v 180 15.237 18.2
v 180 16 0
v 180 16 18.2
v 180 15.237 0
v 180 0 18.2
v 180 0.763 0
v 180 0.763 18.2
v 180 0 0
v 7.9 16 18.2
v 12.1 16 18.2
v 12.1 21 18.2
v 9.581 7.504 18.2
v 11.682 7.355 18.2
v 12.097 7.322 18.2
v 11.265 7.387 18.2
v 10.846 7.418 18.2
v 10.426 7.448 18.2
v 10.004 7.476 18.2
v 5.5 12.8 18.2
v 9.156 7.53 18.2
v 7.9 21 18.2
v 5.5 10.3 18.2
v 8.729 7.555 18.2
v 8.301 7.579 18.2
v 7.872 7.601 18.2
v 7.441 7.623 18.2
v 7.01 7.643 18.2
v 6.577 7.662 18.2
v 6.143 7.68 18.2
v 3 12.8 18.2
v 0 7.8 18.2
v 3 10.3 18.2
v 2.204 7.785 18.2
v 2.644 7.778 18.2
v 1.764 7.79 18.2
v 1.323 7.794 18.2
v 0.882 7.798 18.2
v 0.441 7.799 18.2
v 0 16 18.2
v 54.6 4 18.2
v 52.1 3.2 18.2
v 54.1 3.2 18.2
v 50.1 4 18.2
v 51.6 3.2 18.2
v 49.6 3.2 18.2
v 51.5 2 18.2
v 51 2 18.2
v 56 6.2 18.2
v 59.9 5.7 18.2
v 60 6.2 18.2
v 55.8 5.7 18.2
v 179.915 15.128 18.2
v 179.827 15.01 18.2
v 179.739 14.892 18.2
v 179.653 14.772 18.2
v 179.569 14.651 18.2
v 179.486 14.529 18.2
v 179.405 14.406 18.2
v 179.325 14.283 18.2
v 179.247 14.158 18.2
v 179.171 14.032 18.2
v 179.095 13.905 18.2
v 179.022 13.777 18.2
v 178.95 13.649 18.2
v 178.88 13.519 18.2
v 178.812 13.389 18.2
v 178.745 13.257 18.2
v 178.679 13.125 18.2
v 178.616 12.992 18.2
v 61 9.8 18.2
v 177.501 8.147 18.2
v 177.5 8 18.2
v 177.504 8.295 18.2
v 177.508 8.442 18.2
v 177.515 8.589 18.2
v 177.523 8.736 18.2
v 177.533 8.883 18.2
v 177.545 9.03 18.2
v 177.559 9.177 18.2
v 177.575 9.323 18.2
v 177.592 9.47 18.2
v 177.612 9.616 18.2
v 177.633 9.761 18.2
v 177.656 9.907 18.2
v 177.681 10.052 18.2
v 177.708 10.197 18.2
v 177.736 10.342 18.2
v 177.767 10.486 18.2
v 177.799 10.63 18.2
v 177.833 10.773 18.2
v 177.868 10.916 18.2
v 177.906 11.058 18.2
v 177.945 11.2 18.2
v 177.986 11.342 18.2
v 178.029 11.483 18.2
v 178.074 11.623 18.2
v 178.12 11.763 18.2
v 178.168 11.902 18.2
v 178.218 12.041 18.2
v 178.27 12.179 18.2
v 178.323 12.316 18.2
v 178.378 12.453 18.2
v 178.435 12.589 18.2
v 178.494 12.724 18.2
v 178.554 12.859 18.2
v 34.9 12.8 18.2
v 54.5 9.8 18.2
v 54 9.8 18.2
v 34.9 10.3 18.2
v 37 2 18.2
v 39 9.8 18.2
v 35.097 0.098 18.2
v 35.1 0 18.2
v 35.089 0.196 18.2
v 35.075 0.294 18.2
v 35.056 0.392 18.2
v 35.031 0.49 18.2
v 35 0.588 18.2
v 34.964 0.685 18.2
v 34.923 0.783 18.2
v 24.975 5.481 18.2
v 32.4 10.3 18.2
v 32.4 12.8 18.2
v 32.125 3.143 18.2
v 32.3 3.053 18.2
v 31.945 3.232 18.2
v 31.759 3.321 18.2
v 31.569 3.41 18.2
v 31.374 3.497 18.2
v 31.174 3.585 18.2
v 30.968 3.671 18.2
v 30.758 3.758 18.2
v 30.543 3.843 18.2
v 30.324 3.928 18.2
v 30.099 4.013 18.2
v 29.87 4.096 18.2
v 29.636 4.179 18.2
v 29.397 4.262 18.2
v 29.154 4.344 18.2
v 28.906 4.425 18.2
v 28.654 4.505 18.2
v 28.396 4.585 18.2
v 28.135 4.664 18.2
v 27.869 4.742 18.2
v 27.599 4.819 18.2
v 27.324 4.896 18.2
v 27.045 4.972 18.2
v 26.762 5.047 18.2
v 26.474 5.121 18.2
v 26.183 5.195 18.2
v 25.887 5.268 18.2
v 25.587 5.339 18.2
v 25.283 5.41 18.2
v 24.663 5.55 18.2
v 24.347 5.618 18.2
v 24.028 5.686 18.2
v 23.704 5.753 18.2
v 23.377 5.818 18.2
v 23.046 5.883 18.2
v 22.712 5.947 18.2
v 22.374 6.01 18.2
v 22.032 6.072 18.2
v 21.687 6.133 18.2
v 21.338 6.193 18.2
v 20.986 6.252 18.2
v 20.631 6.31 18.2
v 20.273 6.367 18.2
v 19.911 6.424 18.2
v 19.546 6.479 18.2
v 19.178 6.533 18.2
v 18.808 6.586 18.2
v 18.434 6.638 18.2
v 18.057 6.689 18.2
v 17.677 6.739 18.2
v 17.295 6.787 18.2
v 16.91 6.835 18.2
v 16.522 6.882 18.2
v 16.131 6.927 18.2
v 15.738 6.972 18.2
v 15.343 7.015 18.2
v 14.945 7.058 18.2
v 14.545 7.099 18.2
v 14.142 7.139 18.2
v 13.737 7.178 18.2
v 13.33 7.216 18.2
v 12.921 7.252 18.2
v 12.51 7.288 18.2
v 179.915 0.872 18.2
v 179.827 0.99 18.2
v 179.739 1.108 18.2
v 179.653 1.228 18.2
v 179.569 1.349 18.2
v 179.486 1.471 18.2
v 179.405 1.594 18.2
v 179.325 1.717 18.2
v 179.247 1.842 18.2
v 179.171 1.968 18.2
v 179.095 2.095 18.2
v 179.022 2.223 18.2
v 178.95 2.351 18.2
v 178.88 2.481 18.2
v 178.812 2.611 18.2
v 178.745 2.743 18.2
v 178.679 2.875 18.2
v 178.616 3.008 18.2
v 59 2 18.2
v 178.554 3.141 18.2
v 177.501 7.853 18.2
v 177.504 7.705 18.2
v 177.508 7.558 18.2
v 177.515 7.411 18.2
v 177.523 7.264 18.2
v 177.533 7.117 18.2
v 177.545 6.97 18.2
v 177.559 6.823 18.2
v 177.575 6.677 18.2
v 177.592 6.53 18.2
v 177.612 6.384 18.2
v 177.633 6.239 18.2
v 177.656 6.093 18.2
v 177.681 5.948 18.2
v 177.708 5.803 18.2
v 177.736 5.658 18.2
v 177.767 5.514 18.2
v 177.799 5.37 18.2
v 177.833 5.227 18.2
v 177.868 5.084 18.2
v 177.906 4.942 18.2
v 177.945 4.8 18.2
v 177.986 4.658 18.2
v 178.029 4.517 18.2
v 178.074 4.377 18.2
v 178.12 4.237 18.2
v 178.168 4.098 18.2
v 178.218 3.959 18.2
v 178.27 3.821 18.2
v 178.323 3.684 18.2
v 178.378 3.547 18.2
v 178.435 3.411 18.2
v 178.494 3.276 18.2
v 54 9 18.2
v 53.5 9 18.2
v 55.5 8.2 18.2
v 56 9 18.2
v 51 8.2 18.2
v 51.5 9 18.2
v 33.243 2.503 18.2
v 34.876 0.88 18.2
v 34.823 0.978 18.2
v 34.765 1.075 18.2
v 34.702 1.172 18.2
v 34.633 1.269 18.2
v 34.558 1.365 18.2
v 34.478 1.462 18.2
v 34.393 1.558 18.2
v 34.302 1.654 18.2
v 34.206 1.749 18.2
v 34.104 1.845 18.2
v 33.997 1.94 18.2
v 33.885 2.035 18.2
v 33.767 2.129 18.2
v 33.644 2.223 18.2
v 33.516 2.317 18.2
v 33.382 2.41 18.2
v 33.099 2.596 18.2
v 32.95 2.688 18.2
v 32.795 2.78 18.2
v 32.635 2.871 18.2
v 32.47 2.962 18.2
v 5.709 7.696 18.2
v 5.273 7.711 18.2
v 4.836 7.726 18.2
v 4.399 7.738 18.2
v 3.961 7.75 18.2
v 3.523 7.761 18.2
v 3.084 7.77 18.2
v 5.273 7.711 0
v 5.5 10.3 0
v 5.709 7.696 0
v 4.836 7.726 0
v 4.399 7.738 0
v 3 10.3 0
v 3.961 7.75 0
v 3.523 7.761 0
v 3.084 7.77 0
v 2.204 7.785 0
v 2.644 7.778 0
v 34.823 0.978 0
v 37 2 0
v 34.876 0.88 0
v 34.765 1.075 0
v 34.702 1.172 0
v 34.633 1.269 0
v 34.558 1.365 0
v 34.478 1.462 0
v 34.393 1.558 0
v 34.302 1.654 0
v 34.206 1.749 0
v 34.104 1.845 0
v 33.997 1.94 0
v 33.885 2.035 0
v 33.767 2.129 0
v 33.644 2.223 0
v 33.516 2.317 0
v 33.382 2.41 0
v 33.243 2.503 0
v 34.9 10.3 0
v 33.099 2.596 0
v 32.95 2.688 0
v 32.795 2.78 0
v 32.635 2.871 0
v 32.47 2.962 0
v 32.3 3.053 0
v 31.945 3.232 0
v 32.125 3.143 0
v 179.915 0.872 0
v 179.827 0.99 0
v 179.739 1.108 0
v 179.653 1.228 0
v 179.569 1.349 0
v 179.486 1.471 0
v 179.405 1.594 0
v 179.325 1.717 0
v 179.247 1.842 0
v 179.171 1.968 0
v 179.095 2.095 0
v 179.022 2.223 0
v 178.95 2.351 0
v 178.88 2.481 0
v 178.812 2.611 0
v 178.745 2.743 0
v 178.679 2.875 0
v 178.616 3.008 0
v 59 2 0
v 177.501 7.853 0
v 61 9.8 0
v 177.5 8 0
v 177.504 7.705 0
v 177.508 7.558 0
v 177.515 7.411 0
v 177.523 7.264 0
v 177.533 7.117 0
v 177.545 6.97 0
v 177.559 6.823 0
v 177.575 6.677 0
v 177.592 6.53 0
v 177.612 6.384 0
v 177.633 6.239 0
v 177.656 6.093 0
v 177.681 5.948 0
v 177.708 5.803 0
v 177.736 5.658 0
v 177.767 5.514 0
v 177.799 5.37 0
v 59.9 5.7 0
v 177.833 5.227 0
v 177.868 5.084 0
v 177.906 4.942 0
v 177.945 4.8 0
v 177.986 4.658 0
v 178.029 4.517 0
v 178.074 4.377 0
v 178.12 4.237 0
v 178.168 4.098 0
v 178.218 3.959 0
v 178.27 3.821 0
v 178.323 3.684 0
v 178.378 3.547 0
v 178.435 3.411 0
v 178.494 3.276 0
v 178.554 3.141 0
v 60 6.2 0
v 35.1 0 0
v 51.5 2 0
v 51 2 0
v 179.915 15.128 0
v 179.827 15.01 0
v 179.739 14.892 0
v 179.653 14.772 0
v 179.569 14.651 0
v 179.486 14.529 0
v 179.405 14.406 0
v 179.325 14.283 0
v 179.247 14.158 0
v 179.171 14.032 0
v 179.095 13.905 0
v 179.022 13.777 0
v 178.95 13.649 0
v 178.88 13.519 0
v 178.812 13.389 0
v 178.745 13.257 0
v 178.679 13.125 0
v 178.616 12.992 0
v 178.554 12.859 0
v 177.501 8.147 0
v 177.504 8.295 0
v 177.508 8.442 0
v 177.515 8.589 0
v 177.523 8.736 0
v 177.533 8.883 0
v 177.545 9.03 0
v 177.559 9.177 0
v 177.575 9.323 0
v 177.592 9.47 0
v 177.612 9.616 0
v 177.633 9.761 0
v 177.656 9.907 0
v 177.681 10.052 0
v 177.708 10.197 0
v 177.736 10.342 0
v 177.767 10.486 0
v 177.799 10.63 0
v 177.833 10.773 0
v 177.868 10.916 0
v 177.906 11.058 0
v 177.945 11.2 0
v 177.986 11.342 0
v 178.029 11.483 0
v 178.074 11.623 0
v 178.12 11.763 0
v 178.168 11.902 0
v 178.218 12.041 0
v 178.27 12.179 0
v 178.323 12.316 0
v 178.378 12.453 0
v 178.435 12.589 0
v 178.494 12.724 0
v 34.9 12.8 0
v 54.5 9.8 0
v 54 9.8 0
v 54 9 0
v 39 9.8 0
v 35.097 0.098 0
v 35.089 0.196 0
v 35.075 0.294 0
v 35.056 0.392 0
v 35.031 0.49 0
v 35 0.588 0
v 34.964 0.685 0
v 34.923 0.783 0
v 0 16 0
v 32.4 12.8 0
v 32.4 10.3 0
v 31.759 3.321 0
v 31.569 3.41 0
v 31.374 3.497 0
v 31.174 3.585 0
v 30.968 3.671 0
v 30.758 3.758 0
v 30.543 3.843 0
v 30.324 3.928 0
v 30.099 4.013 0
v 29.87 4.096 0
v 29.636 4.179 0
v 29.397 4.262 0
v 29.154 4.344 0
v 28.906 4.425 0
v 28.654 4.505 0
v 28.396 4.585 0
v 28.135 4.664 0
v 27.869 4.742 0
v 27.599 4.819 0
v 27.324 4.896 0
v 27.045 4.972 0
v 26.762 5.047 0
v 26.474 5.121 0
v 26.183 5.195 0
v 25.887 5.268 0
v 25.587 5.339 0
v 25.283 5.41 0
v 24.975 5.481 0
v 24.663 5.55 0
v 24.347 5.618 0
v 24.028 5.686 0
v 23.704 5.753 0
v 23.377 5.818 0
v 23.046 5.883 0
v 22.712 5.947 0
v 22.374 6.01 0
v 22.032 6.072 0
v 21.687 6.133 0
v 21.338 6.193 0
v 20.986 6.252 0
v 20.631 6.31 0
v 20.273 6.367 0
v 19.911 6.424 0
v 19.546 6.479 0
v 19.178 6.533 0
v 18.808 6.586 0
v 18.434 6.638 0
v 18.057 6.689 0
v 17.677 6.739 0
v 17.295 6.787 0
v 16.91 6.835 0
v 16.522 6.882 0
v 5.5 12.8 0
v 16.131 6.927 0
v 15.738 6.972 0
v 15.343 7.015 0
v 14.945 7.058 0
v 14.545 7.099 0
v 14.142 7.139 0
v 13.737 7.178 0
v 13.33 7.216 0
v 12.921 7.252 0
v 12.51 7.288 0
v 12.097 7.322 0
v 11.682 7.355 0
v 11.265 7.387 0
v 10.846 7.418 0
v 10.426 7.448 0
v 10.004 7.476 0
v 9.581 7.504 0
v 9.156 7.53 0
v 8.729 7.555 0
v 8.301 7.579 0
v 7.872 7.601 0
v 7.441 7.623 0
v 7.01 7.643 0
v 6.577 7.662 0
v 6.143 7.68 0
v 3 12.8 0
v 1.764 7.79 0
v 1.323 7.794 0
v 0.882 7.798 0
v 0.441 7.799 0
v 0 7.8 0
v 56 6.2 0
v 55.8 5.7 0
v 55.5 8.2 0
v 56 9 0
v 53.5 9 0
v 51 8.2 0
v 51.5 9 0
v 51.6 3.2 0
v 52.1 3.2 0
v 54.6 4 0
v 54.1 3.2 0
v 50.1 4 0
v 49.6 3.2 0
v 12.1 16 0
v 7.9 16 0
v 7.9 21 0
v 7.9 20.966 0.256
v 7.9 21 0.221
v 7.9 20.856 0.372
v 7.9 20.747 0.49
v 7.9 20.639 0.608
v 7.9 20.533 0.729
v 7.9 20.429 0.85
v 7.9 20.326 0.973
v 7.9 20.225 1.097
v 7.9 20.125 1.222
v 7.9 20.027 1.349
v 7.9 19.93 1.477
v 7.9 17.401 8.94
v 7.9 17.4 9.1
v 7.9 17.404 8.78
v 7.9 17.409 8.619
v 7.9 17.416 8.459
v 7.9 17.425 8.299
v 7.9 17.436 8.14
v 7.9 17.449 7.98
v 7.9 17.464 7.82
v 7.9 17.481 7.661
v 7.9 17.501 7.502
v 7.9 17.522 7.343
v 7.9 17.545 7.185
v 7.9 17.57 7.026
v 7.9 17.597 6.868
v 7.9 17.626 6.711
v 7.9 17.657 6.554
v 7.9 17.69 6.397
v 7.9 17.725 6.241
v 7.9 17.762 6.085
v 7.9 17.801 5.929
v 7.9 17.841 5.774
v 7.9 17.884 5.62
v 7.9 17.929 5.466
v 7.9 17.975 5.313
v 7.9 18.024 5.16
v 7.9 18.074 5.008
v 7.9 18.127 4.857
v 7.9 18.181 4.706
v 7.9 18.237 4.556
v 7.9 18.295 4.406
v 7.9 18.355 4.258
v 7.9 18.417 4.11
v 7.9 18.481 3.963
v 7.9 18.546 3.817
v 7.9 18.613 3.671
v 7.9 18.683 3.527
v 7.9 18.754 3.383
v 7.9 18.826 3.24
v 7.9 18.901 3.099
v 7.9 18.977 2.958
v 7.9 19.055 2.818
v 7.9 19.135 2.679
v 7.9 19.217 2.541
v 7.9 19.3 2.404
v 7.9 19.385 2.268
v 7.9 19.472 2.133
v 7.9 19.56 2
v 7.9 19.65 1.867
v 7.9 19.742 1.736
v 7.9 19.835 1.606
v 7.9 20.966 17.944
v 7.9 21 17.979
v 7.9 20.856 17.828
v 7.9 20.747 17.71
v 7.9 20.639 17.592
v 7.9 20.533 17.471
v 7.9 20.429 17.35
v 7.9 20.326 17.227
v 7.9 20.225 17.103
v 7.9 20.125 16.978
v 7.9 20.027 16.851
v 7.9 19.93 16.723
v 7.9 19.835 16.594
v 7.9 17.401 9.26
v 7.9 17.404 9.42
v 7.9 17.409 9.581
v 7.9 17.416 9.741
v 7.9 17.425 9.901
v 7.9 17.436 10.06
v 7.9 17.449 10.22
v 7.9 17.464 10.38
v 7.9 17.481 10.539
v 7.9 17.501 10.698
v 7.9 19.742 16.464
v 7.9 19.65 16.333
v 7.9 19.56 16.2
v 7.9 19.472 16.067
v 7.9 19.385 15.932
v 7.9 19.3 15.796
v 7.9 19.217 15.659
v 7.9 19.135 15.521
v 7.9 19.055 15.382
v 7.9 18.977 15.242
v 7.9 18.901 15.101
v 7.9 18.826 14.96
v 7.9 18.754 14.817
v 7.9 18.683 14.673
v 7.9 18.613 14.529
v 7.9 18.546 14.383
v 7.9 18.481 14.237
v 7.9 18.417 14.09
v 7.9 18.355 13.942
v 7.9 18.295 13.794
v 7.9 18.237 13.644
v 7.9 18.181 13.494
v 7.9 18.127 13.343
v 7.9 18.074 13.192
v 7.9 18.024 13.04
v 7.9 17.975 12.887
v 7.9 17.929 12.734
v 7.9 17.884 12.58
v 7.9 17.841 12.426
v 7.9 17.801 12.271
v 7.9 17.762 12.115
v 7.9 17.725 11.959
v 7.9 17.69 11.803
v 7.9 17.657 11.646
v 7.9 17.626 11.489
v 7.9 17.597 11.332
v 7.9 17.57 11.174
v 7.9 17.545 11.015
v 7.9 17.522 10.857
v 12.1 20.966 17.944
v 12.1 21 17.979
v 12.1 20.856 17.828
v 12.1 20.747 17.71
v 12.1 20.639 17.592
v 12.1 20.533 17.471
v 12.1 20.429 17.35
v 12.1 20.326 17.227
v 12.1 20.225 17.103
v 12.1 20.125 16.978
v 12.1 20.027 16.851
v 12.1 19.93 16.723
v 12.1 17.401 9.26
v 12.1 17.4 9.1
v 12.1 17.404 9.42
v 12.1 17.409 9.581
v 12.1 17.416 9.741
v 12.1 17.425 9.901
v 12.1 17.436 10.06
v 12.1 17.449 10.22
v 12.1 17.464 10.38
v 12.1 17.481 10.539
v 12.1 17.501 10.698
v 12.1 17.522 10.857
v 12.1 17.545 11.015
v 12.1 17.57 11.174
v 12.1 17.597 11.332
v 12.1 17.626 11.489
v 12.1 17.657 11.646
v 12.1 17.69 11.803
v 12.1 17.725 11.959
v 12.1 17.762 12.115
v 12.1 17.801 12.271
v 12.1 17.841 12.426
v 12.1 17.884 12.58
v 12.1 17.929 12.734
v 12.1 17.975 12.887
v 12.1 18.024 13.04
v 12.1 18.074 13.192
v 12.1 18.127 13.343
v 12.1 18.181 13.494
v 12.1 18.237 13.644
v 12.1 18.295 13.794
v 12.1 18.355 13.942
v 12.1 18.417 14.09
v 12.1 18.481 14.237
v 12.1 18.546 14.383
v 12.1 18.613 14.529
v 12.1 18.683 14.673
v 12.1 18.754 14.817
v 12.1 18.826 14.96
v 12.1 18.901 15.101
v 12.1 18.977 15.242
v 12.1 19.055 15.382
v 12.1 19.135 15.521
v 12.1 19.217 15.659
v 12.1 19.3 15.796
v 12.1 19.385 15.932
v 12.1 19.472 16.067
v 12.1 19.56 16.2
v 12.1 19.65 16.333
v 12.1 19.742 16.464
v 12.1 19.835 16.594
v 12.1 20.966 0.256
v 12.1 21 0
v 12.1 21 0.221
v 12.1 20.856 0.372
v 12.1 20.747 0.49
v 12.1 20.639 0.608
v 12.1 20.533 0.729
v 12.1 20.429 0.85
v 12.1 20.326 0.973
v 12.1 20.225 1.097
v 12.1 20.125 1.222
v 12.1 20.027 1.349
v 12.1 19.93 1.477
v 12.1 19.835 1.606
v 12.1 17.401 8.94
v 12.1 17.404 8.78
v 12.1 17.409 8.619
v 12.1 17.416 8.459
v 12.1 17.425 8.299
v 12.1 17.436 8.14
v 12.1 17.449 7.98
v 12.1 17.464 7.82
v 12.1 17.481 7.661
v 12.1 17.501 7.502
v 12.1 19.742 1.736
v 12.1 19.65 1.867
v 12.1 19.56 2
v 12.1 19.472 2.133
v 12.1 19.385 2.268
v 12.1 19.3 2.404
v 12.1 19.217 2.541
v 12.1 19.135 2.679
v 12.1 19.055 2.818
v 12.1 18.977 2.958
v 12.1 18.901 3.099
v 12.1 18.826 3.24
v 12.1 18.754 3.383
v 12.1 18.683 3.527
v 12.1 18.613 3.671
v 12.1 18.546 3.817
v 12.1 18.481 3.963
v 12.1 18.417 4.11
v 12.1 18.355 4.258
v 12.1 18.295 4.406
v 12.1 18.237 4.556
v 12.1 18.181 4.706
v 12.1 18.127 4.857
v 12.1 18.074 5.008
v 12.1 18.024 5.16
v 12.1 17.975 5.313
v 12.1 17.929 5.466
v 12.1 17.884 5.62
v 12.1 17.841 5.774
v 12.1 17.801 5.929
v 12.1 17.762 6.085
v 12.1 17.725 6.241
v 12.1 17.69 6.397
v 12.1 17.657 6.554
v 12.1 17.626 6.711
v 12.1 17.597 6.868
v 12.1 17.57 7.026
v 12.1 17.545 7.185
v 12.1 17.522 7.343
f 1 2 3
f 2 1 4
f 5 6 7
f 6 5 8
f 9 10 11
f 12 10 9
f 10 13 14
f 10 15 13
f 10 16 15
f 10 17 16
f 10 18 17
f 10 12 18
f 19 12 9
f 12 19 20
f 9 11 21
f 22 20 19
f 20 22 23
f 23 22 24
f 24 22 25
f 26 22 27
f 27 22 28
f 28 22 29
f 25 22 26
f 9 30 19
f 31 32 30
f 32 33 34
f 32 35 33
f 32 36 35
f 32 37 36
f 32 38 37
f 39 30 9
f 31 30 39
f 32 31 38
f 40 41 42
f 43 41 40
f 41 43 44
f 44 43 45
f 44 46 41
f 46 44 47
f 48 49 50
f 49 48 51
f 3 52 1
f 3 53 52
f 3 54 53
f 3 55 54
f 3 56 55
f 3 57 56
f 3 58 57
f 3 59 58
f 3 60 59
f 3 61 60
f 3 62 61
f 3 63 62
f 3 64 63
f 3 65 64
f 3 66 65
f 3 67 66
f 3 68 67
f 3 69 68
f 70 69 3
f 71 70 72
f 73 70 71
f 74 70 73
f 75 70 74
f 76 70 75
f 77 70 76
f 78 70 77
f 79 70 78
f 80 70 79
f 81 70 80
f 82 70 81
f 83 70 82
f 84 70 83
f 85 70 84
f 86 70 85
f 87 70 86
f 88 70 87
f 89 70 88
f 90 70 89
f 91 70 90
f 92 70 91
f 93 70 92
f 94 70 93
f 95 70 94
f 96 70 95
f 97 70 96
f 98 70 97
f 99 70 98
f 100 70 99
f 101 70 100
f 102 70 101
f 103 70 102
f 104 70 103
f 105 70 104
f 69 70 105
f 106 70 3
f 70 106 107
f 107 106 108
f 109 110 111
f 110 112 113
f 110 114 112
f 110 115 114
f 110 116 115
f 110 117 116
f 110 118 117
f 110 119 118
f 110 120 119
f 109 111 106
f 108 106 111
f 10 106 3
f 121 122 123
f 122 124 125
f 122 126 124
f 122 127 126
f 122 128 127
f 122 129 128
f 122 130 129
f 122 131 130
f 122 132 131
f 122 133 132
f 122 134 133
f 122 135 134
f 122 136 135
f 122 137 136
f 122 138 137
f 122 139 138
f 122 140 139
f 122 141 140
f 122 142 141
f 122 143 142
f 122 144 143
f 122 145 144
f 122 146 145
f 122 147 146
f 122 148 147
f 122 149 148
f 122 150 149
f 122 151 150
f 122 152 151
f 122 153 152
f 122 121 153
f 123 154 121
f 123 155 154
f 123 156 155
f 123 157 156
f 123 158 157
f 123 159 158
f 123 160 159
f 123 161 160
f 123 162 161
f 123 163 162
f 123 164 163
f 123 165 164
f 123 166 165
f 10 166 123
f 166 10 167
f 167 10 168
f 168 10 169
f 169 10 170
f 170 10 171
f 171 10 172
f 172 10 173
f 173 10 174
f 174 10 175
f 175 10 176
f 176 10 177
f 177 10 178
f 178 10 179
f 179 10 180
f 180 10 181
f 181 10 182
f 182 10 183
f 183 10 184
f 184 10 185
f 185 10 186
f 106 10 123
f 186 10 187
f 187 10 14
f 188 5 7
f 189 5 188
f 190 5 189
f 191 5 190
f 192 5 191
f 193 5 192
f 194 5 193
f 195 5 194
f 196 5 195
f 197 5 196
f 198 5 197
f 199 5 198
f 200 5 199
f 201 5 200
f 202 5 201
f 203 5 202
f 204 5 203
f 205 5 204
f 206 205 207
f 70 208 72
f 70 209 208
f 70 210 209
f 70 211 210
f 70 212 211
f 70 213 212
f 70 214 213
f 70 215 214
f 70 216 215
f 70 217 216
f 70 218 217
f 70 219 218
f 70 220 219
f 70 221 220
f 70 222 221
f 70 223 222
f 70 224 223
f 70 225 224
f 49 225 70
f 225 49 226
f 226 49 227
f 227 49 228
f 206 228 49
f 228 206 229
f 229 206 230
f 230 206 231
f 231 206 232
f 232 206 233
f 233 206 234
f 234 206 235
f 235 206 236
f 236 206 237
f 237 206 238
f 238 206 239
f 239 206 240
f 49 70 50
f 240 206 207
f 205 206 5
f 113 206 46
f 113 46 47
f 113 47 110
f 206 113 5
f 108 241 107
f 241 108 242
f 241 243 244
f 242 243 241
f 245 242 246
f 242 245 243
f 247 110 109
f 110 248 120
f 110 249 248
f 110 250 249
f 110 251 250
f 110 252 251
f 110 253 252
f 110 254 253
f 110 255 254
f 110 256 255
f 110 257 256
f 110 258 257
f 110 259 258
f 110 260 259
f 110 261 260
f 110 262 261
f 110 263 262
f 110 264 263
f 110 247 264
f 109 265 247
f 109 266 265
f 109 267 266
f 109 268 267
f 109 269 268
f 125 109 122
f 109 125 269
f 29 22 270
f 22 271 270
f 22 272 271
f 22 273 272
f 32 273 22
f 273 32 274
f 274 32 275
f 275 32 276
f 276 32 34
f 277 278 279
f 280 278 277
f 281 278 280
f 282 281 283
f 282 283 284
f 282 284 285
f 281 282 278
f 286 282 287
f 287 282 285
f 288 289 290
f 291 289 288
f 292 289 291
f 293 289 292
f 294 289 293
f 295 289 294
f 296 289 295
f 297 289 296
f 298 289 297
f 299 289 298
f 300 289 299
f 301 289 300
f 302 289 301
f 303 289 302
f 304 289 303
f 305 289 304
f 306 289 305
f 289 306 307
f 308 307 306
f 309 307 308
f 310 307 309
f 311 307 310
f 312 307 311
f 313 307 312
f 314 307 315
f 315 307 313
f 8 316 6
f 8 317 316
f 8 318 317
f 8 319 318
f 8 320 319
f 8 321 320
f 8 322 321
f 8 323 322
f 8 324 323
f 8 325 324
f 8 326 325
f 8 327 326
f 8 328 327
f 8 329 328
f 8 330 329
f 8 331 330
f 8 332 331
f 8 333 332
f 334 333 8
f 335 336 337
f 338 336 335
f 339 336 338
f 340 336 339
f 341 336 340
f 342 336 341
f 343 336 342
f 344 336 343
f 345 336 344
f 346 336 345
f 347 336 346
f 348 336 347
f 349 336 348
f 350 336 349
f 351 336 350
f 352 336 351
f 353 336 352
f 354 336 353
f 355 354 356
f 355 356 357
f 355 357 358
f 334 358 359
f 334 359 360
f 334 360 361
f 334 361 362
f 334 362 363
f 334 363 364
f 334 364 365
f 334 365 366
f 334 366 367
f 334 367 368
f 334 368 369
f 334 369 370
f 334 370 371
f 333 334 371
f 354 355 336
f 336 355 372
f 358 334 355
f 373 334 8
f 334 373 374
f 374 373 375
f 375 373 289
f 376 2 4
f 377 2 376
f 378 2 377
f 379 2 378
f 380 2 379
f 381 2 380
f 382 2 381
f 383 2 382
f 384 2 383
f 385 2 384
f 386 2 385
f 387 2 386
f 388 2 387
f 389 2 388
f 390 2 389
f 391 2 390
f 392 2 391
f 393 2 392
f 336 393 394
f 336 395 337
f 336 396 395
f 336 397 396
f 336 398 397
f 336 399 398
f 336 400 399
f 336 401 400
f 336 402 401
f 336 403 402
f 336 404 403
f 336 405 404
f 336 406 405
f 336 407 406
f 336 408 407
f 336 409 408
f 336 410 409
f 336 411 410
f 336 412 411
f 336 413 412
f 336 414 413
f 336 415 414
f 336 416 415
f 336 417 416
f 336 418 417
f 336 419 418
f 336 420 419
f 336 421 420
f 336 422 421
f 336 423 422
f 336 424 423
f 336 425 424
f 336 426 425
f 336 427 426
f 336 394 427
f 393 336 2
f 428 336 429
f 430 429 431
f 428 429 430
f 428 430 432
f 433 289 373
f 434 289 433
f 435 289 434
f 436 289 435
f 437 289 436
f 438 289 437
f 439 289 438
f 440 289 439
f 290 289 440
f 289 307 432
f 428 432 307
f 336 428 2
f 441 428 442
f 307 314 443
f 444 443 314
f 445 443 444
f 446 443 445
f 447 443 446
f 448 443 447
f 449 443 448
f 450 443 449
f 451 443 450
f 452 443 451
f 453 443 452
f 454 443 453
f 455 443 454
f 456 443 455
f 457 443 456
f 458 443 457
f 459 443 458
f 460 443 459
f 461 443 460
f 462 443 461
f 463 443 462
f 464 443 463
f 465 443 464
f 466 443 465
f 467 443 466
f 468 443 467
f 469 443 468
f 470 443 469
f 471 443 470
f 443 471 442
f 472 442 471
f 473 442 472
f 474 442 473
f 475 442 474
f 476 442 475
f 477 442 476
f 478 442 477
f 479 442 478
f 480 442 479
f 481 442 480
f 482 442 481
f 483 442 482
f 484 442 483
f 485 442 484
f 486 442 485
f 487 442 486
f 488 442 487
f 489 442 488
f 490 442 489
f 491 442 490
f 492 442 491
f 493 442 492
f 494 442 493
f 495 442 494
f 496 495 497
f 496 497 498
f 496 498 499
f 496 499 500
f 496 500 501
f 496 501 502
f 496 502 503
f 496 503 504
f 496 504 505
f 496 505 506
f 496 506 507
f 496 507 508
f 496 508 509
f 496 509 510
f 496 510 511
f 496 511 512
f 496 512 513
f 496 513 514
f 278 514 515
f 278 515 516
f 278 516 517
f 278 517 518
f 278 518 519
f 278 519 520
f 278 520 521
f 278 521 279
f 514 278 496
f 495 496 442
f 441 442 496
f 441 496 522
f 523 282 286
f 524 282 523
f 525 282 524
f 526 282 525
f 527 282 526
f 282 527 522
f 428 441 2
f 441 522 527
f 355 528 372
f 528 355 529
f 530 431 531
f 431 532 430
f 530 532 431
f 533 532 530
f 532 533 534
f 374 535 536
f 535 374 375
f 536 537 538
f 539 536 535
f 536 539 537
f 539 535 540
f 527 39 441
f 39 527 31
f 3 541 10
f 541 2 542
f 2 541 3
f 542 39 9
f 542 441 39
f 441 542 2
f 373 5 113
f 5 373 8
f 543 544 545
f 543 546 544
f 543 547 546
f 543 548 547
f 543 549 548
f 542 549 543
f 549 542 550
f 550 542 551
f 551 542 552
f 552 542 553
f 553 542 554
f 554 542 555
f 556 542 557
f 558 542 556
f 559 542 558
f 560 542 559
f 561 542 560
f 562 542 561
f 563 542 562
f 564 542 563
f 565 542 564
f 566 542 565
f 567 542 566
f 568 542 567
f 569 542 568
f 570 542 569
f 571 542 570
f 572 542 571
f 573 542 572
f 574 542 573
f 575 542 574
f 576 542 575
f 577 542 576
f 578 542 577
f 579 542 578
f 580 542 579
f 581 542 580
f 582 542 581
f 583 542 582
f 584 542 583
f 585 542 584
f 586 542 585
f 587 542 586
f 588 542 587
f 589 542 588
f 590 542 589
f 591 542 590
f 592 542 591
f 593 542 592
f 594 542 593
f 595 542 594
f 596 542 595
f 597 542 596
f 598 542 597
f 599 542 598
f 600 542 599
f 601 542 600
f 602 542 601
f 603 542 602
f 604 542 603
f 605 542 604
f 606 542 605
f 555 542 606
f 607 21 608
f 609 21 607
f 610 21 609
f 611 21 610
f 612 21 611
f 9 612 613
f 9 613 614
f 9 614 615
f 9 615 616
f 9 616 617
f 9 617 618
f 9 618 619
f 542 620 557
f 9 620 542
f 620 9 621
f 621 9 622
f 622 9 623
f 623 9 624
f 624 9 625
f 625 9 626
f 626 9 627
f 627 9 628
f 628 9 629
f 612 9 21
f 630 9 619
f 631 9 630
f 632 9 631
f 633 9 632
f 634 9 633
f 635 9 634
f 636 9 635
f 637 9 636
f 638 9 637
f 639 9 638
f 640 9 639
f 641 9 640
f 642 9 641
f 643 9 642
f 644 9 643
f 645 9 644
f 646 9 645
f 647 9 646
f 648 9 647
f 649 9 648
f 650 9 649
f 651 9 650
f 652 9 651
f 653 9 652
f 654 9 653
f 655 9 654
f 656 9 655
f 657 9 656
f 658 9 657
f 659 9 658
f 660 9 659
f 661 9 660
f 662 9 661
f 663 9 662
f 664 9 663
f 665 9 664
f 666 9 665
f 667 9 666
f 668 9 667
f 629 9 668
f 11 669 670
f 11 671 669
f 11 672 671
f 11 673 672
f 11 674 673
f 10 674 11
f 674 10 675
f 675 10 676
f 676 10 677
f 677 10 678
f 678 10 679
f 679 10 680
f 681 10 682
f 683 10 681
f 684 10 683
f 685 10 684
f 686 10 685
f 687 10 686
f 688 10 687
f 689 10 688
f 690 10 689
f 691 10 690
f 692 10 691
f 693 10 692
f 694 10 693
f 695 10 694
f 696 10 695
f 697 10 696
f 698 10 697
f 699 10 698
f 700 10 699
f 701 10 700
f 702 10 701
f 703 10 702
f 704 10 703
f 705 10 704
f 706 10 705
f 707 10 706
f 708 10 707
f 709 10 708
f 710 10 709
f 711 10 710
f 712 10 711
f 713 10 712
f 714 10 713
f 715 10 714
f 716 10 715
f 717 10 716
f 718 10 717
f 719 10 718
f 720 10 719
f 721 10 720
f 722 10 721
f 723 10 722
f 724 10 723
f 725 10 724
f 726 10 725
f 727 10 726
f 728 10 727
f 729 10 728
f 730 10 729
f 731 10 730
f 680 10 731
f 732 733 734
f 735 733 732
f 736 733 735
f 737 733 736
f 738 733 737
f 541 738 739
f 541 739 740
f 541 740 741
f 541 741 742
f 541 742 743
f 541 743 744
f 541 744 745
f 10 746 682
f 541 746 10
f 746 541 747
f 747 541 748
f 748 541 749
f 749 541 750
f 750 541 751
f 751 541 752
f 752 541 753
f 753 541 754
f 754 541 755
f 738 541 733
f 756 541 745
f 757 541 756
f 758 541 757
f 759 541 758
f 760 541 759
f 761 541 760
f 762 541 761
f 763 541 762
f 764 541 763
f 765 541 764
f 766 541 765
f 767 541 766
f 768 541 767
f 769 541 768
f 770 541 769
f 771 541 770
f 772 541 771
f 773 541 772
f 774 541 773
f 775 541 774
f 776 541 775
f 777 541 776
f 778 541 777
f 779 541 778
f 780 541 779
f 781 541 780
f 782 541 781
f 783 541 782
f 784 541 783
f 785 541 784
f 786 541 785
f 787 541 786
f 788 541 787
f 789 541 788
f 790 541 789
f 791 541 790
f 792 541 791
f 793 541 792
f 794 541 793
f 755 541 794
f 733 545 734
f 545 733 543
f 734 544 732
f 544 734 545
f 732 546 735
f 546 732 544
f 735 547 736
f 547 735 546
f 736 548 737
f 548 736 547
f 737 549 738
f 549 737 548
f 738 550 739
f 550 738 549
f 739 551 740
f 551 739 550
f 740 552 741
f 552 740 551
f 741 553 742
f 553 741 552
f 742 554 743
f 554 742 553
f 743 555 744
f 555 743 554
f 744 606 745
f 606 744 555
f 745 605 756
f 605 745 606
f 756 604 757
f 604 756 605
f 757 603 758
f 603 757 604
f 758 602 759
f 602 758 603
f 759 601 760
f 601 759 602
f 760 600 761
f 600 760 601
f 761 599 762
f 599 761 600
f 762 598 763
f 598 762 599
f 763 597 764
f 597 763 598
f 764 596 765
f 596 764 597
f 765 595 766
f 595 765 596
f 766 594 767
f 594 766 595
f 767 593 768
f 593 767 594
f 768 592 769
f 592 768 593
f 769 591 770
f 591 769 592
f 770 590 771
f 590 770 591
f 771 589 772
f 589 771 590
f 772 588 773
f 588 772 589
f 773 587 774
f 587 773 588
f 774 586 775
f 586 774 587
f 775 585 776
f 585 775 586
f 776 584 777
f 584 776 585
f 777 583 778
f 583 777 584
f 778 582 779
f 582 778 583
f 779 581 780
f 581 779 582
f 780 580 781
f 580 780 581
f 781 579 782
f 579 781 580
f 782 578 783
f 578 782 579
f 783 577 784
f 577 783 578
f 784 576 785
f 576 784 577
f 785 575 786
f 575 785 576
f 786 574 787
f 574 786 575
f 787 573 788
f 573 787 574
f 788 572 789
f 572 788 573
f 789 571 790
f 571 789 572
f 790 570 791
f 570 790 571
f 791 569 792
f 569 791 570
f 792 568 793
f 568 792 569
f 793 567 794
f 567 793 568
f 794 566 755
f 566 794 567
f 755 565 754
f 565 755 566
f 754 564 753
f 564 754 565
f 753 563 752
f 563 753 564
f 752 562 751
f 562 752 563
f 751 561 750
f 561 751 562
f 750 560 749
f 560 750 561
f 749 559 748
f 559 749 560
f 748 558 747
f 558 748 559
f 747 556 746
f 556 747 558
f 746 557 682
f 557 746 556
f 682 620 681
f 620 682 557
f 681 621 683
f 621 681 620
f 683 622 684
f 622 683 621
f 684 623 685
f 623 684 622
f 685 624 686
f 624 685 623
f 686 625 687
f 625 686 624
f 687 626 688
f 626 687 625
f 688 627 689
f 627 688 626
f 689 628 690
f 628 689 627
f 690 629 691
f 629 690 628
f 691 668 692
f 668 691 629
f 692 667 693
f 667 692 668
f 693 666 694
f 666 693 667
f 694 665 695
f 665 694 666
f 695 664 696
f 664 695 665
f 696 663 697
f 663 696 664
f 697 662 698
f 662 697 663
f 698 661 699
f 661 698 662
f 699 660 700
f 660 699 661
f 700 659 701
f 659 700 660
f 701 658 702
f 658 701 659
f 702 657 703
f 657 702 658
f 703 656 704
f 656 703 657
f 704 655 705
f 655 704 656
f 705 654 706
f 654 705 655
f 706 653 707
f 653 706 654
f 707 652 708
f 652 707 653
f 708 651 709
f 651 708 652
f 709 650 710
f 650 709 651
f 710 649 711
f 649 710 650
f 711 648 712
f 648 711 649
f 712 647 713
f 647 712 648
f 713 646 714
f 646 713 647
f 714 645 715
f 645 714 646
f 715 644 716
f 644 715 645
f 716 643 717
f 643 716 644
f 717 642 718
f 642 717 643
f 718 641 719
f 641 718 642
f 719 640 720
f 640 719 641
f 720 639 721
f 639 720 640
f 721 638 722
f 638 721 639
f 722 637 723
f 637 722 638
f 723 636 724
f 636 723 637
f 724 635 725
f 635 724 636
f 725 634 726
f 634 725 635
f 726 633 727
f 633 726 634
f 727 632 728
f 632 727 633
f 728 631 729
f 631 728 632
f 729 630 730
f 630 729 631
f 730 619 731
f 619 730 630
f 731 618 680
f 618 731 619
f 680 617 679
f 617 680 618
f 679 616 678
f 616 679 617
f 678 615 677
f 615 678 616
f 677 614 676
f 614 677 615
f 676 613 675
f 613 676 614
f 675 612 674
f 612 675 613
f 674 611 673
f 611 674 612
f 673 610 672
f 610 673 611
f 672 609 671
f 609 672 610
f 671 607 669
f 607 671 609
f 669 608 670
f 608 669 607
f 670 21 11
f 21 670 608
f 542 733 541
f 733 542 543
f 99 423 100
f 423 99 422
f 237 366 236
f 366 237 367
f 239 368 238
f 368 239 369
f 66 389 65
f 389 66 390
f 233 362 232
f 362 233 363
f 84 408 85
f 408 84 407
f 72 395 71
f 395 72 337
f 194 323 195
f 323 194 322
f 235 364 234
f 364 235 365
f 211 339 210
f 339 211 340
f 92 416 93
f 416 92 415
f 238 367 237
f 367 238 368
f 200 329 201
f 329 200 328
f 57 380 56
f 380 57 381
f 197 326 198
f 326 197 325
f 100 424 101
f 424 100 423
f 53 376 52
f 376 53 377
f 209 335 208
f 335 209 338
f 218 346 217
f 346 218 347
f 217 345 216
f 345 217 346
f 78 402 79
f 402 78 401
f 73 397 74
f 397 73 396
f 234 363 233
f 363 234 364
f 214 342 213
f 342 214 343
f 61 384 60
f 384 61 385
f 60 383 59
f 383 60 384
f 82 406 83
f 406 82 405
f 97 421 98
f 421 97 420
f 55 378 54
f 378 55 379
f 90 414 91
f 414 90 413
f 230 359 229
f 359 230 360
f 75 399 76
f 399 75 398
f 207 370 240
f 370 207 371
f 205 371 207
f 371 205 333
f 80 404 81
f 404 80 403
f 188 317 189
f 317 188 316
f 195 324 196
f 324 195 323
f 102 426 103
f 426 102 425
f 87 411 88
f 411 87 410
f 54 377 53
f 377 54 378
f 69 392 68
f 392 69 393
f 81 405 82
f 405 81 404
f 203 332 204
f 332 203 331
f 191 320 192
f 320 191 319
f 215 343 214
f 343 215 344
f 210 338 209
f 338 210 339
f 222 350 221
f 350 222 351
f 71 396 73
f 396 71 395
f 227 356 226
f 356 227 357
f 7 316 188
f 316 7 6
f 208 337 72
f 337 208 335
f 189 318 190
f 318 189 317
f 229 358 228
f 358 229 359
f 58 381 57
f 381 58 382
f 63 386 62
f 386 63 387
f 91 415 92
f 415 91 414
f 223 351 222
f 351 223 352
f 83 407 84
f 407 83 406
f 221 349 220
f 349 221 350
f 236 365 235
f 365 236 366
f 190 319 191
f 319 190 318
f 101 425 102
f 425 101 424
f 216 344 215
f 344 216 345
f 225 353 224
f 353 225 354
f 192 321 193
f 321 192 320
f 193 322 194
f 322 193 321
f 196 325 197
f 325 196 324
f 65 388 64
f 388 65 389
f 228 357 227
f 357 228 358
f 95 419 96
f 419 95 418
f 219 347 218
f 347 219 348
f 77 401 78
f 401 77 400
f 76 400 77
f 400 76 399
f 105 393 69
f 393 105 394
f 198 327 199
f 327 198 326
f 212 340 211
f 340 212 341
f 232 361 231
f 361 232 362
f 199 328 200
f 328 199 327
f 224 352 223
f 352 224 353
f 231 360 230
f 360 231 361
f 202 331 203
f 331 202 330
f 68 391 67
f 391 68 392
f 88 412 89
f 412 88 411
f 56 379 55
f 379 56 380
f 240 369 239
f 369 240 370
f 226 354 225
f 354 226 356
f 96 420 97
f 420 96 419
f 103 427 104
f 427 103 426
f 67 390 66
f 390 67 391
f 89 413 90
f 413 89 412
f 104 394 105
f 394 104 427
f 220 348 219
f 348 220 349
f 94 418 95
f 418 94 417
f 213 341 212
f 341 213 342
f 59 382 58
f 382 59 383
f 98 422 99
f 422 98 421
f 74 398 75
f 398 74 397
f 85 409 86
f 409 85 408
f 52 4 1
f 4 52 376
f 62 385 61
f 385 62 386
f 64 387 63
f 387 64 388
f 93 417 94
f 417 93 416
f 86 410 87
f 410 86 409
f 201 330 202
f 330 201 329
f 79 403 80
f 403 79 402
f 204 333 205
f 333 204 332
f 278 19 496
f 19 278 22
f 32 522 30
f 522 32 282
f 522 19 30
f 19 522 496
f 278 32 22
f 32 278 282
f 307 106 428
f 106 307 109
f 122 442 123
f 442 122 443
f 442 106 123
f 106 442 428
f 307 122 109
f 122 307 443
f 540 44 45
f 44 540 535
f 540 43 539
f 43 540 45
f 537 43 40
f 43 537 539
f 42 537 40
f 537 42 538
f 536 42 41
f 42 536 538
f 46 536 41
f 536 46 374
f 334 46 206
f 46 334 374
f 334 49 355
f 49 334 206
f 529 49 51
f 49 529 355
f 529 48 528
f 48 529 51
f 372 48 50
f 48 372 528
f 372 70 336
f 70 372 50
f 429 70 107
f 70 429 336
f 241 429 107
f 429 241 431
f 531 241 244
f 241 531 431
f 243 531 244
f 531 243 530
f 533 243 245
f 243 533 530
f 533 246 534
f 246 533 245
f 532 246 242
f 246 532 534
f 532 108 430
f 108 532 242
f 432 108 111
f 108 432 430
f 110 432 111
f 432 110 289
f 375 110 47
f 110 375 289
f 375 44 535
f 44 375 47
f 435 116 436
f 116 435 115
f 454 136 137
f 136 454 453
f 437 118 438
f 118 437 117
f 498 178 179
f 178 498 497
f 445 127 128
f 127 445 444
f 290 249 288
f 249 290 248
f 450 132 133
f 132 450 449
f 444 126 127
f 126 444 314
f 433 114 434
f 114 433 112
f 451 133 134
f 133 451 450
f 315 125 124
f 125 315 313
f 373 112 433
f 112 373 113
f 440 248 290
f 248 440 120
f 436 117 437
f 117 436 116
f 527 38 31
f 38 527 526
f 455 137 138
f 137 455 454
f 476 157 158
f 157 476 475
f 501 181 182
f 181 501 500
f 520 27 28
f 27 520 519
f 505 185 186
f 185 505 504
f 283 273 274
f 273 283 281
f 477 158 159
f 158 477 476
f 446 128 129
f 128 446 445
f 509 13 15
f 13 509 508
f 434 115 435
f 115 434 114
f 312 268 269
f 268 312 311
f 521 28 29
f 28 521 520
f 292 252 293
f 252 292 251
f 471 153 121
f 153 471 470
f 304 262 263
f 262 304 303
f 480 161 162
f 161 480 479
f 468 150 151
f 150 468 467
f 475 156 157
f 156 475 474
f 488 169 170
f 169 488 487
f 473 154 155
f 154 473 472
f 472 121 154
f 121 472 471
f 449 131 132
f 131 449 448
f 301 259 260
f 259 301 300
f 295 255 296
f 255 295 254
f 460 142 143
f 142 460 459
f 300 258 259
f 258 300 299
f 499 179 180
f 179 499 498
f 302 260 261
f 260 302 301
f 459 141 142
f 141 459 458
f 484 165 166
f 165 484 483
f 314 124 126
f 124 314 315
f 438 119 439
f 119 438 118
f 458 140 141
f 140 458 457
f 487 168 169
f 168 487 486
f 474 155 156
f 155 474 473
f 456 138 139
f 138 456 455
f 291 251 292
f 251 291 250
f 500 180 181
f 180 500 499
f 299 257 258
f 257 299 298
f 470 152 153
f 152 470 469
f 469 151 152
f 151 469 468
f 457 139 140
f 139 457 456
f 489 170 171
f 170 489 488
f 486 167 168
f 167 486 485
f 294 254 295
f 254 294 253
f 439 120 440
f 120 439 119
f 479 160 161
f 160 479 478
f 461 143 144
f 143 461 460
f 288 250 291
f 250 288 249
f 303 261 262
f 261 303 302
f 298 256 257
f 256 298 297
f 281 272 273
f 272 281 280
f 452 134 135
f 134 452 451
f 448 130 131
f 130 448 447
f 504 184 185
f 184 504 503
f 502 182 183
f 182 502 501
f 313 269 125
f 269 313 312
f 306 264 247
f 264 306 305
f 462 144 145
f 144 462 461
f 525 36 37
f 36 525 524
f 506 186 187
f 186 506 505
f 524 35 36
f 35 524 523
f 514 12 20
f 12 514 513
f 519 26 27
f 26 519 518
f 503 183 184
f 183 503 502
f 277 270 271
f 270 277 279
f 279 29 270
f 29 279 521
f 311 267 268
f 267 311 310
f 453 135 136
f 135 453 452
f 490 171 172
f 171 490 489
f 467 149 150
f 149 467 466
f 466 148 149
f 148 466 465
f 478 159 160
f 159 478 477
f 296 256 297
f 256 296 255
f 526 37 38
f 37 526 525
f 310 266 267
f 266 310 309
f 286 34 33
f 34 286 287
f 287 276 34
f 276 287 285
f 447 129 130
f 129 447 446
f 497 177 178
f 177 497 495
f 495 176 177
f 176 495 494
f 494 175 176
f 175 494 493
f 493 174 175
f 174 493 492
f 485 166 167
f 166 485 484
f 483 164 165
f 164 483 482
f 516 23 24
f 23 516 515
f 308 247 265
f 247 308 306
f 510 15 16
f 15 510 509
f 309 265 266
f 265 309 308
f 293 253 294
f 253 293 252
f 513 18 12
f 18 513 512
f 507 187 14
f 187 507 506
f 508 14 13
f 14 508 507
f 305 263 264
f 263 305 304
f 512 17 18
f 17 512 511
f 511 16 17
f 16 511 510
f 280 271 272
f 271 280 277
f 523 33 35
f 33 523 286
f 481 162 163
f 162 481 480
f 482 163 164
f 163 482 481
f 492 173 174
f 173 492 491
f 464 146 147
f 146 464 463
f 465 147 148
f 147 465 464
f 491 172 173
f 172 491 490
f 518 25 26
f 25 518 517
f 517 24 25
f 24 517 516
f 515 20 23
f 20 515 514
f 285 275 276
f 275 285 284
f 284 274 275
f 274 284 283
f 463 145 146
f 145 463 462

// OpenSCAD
/********************************************/
/*     Longer barrel with better angle      */
/*                                          */
/*        Created by Jason Hardman          */
/*               2023-07-24                 */
/*                                          */
/********************************************/

// Original Design by Gavilan:
// https://www.thingiverse.com/gavilan/designs
// https://www.thingiverse.com/thing:217067

$fn = 500;

// Dimensions
diffx_buffer = 0.1;  // difference extrusion buffer
translation_offset = diffx_buffer / 2; 
z_height = 18.2;                              // z - from bed
cutout_depth = z_height + diffx_buffer;       // just longer than bar height for difference

bar_length = 180;                             // x - as expected
bar_width = 16;                               // y - from bed
bar_tip_rad = 23.45 / 2;                      // x
bar_tip_offset = bar_tip_rad-2.5;             // x

scrw_hole_diam = 2.5;                         // x - square side
scrw_hole_distance = 29.4;                    // x

//a0 = [[-2,0],[0,7.8],[135,7.8],[136,0]];      // main
//b0 = [0, 1, 2, 3];
a1 = [                                        // Letter B
      [-2,0],[0,7.8],[15,7.8],                // points A, B, C
      [14.5,7],[12.5,7],[12,6.2],             // points D, E, F
      [16.5,6.2],[17,7],[15,7],           // Points G, H, I
      [15.5,7.8],[22,7.8],[21,4.2],             // Points J, K, L
      [17,4.2],[16.8,3.7],[20.9,3.7],             // Points M, N, O
      [20,0],[12.5,0],[13.1,1.2],                       // Points P, Q, R
      [15.1,1.2],[15.6,2],[11.1,2],                             // Points S, T, U
      [10.6,1.2],[12.6,1.2],[12,0]                            // Points V, W, X
];
b1 = [
  0, 1, 2, 3,
  4, 5, 6,
  7, 8, 9,
  10, 11, 12,
  13, 14, 15,
  16, 17, 18,
  19, 20, 21,
  22, 23//, 24,
  //25, 26, 27
];
cutout_points = concat (a1);
cutout_paths = [b1];

sight_height = 21;                            // y - before rotation
sight_width = z_height;                       // x - before rotation
sight_cutout_rad = 25.5/2;                    // x
sight_cutout_offset = sight_cutout_rad-3.6;   // y - before rotation
sight_thickness = 4.2;                        // z - before rotation

// Modules
module scrw_hole(tx=0, ty=0, tz=0) {
  translate([tx, ty, tz - translation_offset]) {
    cube([scrw_hole_diam, scrw_hole_diam, cutout_depth]);
  }
}

module scrw_hole_pair(ptx=0, pty=0, ptz=0) {
      scrw_hole(ptx, pty, ptz);
      scrw_hole(ptx+scrw_hole_distance, pty, ptz);
}

module long_cutaway(tx=0, ty=0, tz=0) {
  translate([tx, ty, tz - translation_offset]) {
    linear_extrude(height=cutout_depth) {
      polygon(cutout_points, cutout_paths);
    }
  }
}

module elps_cutaway(tx=0, ty=0, tz=0) {
  translate([tx, ty, tz - translation_offset]) {
    scale([4.5, 1, 1]) {
      cylinder(h=cutout_depth, r=7.8);
    }
  }
}

module the_sight(rx=0, ry=0, rz=0, tx=0, ty=0, tz=0) {
  translate([tx, ty, tz]) {
    rotate([rx, ry, rz]) {
      linear_extrude(height=sight_thickness) {
        difference() {
          square([sight_width ,sight_height]);
          translate([sight_width/2, sight_height+sight_cutout_offset, 0]) {
            circle(sight_cutout_rad);
          }
        }
      }
    }
  }
}

module main_barrel() {
  difference() {
    union() {
      cube([bar_length,bar_width,z_height]);
      the_sight(rx=0, ry=90, rz=0, tx=7.9, ty=0, tz=sight_width);
    }
    translate([bar_length+bar_tip_offset, bar_width/2, 0]) {
      cylinder(h=cutout_depth*2, r=bar_tip_rad, center=true);
    }
  }
}

// module calls
difference() {
  main_barrel();
  scrw_hole_pair(ptx=3, pty=bar_width-(3.2+scrw_hole_diam), ptz=0);
  long_cutaway(39, 2, 0);
  elps_cutaway(0, 0, 0);
}

*long_cutaway(39, 2, 0);
